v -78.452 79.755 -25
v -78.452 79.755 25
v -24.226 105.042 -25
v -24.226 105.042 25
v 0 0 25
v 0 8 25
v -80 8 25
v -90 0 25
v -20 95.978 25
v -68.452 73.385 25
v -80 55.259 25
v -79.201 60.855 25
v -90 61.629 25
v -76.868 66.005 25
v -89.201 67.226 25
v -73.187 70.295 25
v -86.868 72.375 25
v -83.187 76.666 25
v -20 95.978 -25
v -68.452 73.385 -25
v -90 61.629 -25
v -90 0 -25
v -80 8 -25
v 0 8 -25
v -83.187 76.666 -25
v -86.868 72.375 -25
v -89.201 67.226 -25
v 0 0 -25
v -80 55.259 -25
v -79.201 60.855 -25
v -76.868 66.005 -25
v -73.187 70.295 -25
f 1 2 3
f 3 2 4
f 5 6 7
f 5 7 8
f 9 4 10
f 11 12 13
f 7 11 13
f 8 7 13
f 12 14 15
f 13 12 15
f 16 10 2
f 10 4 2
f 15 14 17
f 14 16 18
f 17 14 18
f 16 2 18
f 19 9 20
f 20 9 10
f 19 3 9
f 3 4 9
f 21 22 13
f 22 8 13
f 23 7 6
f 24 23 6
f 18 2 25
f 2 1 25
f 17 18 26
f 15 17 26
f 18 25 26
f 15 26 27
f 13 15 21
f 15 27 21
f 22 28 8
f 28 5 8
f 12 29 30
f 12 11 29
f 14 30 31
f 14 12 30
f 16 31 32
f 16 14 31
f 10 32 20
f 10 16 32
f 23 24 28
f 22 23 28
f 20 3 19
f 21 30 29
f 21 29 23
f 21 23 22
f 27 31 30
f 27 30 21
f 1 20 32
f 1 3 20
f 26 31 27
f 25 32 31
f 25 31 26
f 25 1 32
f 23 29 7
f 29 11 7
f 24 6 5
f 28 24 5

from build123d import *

# Parameters (mm, degrees)
SALIENTE_EXTRUIR1_DEPTH = 25
REDONDEO1_R             = 20


with BuildPart() as part:
    # Croquis1 → Saliente-Extruir1 (new, symmetric)
    with BuildSketch(Plane.XY):
        Polygon((0, 8), (0, 0), (-90, 0), (-90, 74.370702608), (-24.226182617, 105.04153736), (-20, 95.978459489), (-80, 68), (-80, 8), align=None)
    extrude(amount=SALIENTE_EXTRUIR1_DEPTH, both=True)

    # Redondeo1
    redondeo1_edges = [part.edges().sort_by_distance(p)[0] for p in [
        (-90, 74.370702608, 0),
        (-80, 68, 0),
    ]]
    fillet(redondeo1_edges, radius=REDONDEO1_R)


solid = part.part
